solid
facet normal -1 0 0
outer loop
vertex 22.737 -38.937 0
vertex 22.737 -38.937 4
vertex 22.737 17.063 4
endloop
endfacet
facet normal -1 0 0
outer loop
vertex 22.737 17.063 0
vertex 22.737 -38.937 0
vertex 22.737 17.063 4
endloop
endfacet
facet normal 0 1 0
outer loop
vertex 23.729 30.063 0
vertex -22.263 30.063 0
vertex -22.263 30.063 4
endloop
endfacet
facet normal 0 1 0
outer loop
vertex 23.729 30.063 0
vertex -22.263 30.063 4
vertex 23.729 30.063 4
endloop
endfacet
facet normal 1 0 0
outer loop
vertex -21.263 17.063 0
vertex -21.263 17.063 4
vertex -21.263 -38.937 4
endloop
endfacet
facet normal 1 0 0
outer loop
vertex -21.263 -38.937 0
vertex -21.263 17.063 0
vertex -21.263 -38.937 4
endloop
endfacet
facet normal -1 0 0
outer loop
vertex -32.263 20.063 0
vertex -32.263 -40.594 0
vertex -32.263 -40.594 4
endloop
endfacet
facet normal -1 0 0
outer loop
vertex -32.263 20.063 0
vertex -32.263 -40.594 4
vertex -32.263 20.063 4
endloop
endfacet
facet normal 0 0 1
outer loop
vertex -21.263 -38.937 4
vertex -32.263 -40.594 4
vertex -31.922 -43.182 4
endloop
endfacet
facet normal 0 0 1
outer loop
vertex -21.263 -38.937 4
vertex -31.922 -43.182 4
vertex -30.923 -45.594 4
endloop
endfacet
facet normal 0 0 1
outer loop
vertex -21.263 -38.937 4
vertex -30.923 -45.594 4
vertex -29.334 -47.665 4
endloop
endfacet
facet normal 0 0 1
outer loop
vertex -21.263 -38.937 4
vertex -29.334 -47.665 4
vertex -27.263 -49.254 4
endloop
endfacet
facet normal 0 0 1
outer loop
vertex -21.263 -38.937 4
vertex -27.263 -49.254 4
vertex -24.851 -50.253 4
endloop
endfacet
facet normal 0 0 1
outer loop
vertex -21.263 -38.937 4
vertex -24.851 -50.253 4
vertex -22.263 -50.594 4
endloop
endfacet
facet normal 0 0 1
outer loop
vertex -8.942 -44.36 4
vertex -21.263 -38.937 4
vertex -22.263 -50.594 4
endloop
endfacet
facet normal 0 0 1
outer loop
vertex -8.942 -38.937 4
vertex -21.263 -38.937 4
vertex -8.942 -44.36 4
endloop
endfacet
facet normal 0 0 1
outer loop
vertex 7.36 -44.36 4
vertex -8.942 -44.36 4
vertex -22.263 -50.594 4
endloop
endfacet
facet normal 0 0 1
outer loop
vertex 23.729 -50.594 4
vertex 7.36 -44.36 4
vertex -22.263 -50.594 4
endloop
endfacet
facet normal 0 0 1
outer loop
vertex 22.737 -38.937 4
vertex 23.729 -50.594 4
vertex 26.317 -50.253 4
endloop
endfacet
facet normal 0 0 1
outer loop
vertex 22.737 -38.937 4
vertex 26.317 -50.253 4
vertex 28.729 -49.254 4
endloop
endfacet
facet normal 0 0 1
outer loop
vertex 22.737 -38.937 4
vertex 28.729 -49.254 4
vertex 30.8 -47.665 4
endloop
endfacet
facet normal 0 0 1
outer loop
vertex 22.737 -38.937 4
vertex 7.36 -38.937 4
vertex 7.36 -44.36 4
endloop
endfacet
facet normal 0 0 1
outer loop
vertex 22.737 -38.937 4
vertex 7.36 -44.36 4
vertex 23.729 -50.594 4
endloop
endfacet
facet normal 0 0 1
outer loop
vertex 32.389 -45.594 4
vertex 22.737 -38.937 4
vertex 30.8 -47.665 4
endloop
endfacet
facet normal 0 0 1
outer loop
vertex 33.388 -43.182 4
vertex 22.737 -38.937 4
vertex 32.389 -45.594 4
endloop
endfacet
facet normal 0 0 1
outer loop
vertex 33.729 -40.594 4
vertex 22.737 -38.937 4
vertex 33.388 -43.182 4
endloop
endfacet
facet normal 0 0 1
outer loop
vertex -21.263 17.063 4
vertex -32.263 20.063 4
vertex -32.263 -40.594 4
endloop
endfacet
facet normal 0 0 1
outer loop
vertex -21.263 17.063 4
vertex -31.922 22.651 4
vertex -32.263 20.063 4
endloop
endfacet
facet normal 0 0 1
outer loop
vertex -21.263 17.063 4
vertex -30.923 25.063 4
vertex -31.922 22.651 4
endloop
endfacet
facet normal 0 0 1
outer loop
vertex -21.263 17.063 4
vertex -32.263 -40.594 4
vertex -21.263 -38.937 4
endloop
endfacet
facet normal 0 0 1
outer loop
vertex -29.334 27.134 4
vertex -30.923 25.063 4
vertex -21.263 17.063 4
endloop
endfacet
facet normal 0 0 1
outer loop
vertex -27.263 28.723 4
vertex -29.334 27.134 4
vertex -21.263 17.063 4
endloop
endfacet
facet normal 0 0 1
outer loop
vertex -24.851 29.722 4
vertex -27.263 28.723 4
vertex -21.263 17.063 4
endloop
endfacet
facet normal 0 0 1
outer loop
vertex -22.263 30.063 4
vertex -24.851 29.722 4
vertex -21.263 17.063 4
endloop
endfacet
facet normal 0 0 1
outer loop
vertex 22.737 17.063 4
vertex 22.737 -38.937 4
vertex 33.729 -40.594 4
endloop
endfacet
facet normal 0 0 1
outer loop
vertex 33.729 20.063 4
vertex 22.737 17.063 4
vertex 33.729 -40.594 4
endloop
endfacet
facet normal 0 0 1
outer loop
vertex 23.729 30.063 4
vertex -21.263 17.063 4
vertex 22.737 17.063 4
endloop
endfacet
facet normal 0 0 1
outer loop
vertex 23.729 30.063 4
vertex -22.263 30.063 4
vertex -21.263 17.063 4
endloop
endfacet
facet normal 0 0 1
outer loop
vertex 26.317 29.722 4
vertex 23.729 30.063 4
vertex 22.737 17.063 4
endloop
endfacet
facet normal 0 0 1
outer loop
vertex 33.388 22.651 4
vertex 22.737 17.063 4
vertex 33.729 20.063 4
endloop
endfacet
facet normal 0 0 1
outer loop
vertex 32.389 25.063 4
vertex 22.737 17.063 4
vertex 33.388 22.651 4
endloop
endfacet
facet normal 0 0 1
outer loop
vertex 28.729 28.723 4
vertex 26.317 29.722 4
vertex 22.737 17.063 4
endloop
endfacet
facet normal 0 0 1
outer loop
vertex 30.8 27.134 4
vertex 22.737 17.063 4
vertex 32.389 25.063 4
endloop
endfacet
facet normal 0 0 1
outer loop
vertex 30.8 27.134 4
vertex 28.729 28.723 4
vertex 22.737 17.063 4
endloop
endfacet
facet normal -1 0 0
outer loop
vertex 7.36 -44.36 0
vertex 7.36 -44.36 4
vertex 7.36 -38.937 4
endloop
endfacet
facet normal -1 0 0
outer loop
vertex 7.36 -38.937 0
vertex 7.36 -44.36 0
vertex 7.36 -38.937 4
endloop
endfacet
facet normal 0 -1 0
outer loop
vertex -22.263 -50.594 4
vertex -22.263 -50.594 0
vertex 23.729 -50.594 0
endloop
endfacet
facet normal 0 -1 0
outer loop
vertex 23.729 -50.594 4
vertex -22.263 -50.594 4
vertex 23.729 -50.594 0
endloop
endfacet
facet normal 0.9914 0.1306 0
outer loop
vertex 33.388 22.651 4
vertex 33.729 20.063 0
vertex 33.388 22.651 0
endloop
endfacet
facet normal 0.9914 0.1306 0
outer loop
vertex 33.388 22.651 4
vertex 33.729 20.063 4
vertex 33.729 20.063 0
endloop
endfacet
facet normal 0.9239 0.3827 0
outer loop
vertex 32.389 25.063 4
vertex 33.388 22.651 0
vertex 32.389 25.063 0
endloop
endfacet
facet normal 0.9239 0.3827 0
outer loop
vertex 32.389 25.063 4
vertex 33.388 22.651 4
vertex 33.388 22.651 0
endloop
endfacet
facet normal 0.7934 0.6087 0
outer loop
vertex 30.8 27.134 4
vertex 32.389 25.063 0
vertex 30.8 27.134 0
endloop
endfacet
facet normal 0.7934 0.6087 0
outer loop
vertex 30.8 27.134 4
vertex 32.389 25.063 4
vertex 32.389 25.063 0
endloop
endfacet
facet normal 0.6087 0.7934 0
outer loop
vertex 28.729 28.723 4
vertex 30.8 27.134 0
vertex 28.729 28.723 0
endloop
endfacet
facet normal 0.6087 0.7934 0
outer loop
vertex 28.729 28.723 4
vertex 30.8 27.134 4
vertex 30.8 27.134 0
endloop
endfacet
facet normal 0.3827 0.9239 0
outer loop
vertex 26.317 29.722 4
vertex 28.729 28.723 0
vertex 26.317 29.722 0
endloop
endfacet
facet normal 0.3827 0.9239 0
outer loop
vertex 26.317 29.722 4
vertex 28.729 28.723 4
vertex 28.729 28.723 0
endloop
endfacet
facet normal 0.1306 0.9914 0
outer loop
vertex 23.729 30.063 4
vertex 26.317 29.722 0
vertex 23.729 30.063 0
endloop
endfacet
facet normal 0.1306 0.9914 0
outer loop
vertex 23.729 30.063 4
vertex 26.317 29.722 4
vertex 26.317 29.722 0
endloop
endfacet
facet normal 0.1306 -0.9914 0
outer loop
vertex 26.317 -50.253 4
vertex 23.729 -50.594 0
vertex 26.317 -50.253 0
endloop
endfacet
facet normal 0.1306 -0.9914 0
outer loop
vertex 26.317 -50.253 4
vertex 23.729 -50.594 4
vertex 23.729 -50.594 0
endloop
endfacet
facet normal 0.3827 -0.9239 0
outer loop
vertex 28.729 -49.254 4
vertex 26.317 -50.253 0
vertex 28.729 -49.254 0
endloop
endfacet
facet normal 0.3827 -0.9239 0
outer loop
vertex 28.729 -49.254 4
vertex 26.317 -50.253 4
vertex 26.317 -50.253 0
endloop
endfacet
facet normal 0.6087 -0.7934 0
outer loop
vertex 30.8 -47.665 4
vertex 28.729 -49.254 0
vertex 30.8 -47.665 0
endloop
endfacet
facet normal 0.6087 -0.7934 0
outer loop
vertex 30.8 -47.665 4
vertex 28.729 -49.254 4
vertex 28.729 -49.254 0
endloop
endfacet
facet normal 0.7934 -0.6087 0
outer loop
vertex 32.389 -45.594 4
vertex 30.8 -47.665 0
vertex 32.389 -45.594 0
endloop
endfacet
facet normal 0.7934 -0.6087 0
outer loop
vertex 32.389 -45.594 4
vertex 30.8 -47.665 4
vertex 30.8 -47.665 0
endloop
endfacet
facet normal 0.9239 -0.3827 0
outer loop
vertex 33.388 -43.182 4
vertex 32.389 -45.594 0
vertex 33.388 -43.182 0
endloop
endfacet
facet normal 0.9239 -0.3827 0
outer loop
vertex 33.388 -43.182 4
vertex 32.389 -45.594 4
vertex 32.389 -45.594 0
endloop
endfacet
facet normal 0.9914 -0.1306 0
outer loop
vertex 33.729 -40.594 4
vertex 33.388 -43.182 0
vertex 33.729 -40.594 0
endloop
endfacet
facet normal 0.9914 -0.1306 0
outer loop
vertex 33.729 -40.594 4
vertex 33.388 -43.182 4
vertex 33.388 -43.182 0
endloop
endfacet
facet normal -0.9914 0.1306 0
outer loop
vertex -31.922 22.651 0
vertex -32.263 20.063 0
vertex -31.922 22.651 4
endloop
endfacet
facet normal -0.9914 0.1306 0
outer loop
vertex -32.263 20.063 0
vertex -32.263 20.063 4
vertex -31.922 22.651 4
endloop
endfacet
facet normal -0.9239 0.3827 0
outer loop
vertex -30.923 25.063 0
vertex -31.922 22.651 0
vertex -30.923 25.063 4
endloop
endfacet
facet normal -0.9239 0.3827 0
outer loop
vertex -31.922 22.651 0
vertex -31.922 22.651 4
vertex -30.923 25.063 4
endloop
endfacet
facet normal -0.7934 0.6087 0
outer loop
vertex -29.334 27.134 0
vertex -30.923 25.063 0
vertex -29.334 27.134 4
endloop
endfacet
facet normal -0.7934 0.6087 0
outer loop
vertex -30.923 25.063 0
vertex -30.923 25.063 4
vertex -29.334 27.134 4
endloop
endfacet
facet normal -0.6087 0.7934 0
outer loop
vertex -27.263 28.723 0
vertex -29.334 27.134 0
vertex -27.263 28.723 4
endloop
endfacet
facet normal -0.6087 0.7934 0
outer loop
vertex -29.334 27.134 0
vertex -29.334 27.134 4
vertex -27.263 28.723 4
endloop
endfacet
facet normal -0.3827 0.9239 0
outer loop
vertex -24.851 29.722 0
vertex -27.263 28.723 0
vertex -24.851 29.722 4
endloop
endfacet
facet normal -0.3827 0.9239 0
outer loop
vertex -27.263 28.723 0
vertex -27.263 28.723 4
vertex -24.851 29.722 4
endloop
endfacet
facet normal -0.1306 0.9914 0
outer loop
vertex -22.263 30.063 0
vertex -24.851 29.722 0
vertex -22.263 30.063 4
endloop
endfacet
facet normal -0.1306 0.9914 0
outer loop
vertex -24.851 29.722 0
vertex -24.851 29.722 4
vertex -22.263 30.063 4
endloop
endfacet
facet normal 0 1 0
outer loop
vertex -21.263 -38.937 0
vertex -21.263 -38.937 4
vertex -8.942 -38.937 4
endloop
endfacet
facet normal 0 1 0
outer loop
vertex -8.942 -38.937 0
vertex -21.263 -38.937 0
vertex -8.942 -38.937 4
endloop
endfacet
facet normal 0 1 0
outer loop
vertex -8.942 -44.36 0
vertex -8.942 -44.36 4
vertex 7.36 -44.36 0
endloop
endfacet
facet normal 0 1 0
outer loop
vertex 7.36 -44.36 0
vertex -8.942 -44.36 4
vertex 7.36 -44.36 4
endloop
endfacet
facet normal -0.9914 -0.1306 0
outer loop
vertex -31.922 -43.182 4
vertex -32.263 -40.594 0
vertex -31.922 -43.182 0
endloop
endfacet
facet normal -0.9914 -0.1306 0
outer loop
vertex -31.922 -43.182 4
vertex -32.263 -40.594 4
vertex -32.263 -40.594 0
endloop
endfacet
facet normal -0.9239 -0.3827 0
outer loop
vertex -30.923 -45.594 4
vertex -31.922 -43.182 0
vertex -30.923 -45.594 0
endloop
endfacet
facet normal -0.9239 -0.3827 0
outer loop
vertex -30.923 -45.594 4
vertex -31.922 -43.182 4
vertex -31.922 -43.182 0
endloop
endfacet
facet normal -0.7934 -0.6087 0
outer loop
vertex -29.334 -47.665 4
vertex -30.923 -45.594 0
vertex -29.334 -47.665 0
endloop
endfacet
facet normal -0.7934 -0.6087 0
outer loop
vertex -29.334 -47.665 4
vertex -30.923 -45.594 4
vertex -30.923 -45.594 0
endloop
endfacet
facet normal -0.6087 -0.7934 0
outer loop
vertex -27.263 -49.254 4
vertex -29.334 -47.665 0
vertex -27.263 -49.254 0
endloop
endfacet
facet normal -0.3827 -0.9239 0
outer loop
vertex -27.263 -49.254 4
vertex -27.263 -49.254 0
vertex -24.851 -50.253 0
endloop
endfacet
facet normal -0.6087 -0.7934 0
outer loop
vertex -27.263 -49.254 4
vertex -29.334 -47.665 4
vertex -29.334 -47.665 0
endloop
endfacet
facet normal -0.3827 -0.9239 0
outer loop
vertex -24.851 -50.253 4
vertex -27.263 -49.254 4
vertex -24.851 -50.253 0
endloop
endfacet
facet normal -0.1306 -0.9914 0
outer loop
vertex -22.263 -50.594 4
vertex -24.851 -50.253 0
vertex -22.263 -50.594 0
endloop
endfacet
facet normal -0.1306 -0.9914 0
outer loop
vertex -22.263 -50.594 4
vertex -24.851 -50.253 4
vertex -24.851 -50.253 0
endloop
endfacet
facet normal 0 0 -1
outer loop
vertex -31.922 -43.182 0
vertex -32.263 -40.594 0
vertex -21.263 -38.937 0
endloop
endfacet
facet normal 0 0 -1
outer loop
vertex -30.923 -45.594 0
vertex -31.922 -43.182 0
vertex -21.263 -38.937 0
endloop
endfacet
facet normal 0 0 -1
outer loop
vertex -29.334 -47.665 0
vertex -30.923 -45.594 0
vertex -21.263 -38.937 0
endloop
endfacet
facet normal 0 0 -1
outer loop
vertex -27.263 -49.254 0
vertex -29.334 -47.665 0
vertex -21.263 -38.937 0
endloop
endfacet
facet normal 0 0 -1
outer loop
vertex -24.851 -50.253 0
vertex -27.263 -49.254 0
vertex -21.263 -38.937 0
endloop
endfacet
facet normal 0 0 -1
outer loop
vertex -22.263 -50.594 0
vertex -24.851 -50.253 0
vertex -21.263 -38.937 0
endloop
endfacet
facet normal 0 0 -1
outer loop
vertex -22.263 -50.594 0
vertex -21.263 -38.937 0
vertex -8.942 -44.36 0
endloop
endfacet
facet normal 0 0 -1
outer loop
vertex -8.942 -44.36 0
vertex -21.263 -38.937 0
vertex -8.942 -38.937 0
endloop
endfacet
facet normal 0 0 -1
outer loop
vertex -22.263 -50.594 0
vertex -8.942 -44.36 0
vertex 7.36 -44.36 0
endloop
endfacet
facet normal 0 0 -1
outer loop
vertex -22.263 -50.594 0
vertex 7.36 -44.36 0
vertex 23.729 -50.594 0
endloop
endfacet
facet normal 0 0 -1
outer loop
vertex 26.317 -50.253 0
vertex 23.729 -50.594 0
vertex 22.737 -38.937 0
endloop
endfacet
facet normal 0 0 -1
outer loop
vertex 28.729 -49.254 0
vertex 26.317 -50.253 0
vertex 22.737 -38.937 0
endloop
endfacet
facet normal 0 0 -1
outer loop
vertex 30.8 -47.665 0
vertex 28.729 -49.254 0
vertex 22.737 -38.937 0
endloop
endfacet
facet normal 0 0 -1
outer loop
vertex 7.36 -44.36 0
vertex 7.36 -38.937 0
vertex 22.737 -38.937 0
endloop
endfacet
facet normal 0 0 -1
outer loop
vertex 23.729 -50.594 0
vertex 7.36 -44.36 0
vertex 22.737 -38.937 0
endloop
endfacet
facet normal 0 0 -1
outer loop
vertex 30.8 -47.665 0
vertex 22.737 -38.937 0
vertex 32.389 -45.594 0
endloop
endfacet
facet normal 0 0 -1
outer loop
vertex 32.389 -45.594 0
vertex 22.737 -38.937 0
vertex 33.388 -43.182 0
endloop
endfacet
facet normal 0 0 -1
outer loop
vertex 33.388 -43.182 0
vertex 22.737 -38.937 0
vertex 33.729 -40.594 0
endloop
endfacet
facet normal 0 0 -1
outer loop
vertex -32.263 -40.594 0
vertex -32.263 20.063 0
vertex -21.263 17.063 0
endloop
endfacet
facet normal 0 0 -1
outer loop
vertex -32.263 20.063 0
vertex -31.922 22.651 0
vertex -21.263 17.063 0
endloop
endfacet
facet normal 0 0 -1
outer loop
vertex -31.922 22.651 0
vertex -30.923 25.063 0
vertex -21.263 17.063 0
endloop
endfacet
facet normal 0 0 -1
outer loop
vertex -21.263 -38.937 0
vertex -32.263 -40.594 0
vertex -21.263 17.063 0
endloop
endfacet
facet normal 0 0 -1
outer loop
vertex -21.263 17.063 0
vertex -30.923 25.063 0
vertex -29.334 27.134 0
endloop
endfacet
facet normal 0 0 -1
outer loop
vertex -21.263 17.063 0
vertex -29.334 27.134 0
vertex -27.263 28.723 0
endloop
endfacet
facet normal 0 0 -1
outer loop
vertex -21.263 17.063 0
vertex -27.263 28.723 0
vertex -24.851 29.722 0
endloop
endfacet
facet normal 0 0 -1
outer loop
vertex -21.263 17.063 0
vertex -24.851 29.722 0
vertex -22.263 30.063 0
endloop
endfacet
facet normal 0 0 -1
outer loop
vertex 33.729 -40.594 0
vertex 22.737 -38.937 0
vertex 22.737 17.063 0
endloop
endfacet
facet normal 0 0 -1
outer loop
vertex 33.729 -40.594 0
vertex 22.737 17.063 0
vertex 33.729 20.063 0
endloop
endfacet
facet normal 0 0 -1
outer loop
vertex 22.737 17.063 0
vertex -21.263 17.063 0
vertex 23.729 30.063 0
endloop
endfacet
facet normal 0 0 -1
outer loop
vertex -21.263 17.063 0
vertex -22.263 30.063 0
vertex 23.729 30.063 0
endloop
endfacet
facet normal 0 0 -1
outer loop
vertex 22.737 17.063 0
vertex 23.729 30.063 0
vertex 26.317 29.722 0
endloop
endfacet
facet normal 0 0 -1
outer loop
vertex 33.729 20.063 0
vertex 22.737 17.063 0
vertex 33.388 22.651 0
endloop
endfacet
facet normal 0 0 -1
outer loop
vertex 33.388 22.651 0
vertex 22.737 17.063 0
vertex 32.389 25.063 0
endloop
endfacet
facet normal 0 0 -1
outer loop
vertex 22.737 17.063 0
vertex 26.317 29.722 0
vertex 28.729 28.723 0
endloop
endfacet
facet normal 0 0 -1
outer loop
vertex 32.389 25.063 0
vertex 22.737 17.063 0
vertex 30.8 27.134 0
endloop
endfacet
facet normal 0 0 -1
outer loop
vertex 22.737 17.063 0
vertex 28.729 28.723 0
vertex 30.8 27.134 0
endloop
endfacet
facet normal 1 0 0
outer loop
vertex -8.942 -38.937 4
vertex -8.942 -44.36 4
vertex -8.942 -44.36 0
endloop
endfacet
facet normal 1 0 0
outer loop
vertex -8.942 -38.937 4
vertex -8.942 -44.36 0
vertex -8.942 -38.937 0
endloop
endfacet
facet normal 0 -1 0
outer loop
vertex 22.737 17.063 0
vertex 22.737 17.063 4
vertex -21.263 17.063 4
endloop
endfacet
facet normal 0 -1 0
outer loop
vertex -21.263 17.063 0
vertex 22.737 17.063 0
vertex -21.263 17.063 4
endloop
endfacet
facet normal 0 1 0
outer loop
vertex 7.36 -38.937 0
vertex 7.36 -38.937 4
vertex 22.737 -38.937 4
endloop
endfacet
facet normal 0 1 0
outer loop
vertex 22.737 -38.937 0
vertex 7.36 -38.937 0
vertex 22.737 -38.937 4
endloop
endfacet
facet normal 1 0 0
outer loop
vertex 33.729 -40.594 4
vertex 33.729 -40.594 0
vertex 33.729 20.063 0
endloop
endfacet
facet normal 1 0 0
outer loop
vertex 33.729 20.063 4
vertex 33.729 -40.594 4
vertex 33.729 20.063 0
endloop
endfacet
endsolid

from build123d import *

# Parameters (mm, degrees)
F0_W     = 65.991625
F0_H     = 80.656428
F1_DEPTH = 4
F3_R     = 10
F2_W     = 16.302
F2_H     = 5.422647
F4_DEPTH = 25


with BuildPart() as f1:
    # F0 (on Top) → F1 (new body)
    with BuildSketch(Plane.XY):
        with Locations((0.733241, -10.265363)):
            Rectangle(F0_W, F0_H)
    extrude(amount=F1_DEPTH)

    # F3
    f3_edges = [f1.edges().sort_by_distance(p)[0] for p in [
        (33.729054, 30.062851, 2),
        (-32.262571, 30.062851, 2),
        (-32.262571, -50.593577, 2),
        (33.729054, -50.593577, 2),
    ]]
    fillet(f3_edges, radius=F3_R)

    # F2 (on face) → F4 (cut)
    with BuildSketch(Plane.XY.offset(4)):
        with Locations((-0.79059, -41.648472)):
            Rectangle(F2_W, F2_H)
        Polygon((22.737429, 17.062851), (-21.262571, 17.062851), (-21.262571, -38.937149), (-8.94159, -38.937149), (7.36041, -38.937149), (22.737429, -38.937149), align=None)
    extrude(amount=-F4_DEPTH, mode=Mode.SUBTRACT)


solid = f1.part
